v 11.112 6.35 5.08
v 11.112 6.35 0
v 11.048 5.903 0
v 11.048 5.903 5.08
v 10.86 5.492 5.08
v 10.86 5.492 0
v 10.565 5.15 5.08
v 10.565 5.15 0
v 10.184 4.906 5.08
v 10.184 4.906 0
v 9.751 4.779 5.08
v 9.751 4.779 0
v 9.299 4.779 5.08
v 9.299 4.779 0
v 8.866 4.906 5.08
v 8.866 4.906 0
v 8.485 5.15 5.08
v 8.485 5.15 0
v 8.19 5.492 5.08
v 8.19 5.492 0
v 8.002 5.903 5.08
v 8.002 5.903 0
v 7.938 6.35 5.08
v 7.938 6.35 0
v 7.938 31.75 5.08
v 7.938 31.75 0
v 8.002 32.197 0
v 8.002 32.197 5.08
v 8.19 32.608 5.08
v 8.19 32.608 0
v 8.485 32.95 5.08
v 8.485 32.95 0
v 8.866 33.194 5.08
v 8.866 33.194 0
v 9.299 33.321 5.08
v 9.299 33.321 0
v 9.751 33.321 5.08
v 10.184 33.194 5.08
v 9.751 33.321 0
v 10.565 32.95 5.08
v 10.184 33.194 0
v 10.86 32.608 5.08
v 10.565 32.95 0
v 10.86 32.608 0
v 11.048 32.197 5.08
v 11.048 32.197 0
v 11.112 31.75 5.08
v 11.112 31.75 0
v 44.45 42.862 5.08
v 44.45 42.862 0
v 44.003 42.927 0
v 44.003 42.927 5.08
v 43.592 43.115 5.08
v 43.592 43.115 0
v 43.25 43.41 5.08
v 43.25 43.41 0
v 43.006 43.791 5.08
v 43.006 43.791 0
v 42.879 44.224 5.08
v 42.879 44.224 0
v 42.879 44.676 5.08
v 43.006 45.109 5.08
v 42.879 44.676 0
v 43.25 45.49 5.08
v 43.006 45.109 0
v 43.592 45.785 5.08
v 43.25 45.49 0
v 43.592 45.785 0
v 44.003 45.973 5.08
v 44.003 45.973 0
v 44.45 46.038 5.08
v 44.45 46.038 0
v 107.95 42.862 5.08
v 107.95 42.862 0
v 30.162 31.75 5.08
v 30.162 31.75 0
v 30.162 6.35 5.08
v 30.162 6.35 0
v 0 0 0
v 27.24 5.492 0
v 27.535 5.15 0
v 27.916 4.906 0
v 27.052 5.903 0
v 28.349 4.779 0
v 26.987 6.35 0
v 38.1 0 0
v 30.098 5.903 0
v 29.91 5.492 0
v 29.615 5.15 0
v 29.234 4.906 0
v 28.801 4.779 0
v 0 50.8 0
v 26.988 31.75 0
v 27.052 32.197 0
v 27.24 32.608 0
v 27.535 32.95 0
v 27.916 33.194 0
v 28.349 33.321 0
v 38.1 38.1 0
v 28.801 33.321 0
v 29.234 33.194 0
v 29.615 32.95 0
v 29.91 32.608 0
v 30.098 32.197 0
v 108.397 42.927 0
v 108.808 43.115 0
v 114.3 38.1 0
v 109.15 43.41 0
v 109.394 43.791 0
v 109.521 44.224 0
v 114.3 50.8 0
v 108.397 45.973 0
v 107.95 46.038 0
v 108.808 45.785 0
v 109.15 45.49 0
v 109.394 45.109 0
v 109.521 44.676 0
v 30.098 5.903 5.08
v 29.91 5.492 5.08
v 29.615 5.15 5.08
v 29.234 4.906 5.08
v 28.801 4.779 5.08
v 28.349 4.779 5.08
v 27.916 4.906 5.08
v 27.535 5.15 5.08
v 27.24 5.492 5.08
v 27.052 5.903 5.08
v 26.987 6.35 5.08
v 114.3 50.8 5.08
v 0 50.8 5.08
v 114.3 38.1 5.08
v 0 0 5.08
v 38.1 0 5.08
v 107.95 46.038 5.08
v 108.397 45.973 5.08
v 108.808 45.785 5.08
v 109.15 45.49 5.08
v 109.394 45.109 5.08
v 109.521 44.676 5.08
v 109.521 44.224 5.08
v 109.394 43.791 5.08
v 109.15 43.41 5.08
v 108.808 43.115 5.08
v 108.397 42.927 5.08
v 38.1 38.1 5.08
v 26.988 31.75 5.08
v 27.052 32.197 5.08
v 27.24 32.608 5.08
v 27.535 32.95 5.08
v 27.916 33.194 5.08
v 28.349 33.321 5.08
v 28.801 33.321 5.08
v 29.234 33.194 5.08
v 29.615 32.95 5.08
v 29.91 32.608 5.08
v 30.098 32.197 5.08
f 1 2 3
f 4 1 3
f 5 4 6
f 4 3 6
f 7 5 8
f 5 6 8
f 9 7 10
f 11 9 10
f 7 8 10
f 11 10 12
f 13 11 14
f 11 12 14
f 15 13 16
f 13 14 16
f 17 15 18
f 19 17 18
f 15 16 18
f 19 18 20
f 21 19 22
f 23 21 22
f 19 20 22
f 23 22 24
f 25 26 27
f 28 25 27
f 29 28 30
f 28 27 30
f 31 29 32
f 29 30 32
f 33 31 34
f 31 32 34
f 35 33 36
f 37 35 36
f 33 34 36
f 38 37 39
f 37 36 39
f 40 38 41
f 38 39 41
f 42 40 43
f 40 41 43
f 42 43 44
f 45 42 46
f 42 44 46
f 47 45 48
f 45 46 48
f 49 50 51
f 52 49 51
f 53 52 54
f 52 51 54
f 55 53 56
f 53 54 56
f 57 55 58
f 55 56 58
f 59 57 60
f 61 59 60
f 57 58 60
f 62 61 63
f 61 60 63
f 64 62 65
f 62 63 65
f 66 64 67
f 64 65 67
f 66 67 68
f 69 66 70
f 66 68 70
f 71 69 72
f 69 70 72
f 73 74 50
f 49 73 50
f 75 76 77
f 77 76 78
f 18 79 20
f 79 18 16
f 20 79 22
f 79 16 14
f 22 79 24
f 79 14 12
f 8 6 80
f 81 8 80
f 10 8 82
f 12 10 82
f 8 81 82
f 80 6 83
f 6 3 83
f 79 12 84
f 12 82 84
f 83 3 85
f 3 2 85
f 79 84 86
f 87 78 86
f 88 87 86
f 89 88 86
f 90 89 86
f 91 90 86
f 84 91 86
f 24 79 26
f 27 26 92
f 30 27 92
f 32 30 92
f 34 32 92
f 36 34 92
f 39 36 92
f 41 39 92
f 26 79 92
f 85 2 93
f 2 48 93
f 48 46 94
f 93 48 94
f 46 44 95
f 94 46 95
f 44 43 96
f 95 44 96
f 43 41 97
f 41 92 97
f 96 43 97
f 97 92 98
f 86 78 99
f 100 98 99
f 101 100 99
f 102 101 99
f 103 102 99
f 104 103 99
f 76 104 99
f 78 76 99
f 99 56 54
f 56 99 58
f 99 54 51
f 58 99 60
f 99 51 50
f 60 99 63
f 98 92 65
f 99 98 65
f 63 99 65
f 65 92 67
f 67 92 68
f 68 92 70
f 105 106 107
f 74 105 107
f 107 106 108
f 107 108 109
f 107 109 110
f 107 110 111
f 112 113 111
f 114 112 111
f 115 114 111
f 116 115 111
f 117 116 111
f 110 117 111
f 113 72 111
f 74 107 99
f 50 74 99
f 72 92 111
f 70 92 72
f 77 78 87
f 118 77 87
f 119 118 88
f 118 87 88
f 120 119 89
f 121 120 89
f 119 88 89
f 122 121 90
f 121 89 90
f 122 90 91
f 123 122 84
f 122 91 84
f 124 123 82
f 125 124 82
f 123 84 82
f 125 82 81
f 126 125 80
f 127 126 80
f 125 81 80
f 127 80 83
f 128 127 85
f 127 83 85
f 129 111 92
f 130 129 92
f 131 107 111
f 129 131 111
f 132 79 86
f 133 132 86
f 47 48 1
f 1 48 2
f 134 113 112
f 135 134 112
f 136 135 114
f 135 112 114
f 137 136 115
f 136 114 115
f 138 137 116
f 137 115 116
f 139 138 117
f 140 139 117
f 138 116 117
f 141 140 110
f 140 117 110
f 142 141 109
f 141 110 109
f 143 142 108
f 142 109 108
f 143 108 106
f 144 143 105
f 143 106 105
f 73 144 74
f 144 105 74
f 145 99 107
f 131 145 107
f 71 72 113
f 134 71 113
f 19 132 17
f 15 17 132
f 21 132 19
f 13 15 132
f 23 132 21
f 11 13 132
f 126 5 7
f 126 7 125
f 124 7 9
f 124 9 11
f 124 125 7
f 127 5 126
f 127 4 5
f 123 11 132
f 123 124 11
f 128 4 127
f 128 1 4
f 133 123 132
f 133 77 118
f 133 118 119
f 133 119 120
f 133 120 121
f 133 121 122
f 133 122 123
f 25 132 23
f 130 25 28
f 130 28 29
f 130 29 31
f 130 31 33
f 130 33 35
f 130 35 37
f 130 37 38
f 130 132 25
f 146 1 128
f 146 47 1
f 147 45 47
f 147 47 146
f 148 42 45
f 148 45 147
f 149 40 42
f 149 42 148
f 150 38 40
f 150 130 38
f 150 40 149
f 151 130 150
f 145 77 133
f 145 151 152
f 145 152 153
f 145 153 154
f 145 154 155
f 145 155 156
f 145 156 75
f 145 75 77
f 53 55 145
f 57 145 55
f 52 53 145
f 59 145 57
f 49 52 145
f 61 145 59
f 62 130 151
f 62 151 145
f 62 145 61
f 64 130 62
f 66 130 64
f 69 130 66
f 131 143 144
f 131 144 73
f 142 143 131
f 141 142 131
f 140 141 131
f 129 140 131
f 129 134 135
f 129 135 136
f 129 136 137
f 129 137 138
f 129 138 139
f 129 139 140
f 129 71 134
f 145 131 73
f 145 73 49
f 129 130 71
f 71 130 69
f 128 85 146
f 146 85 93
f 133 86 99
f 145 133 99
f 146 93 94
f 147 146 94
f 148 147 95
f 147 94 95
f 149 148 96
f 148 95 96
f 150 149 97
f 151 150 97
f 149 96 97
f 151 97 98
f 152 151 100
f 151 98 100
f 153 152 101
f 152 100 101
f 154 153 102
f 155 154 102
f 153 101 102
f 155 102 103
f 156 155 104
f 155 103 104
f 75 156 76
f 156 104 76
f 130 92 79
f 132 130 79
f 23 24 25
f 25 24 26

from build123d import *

# Parameters (mm, degrees)
BOSS_EXTRUDE2_DEPTH = 5.08


with BuildPart() as part:
    # Sketch1 → Boss-Extrude2 (new body)
    with BuildSketch(Plane.XY):
        Polygon((0, 0), (38.1, 0), (38.1, 38.1), (114.3, 38.1), (114.3, 50.8), (0, 50.8), align=None)
        with BuildLine():
            Line((7.9375, 6.35), (7.9375, 31.75))
            ThreePointArc((7.9375, 31.75), (9.525, 33.3375), (11.1125, 31.75))
            Line((11.1125, 31.75), (11.1125, 6.35))
            ThreePointArc((11.1125, 6.35), (9.525, 4.7625), (7.9375, 6.35))
        make_face(mode=Mode.SUBTRACT)
        with BuildLine():
            Line((30.1625, 31.75), (30.1625, 6.35))
            ThreePointArc((30.1625, 6.35), (28.575, 4.7625), (26.9875, 6.35))
            Line((26.9875, 6.35), (26.9875, 31.75))
            ThreePointArc((26.9875, 31.75), (28.575, 33.3375), (30.1625, 31.75))
        make_face(mode=Mode.SUBTRACT)
        with BuildLine():
            Line((107.95, 42.8625), (44.45, 42.8625))
            ThreePointArc((44.45, 42.8625), (42.8625, 44.45), (44.45, 46.0375))
            Line((44.45, 46.0375), (107.95, 46.0375))
            ThreePointArc((107.95, 46.0375), (109.5375, 44.45), (107.95, 42.8625))
        make_face(mode=Mode.SUBTRACT)
    extrude(amount=BOSS_EXTRUDE2_DEPTH)


solid = part.part
